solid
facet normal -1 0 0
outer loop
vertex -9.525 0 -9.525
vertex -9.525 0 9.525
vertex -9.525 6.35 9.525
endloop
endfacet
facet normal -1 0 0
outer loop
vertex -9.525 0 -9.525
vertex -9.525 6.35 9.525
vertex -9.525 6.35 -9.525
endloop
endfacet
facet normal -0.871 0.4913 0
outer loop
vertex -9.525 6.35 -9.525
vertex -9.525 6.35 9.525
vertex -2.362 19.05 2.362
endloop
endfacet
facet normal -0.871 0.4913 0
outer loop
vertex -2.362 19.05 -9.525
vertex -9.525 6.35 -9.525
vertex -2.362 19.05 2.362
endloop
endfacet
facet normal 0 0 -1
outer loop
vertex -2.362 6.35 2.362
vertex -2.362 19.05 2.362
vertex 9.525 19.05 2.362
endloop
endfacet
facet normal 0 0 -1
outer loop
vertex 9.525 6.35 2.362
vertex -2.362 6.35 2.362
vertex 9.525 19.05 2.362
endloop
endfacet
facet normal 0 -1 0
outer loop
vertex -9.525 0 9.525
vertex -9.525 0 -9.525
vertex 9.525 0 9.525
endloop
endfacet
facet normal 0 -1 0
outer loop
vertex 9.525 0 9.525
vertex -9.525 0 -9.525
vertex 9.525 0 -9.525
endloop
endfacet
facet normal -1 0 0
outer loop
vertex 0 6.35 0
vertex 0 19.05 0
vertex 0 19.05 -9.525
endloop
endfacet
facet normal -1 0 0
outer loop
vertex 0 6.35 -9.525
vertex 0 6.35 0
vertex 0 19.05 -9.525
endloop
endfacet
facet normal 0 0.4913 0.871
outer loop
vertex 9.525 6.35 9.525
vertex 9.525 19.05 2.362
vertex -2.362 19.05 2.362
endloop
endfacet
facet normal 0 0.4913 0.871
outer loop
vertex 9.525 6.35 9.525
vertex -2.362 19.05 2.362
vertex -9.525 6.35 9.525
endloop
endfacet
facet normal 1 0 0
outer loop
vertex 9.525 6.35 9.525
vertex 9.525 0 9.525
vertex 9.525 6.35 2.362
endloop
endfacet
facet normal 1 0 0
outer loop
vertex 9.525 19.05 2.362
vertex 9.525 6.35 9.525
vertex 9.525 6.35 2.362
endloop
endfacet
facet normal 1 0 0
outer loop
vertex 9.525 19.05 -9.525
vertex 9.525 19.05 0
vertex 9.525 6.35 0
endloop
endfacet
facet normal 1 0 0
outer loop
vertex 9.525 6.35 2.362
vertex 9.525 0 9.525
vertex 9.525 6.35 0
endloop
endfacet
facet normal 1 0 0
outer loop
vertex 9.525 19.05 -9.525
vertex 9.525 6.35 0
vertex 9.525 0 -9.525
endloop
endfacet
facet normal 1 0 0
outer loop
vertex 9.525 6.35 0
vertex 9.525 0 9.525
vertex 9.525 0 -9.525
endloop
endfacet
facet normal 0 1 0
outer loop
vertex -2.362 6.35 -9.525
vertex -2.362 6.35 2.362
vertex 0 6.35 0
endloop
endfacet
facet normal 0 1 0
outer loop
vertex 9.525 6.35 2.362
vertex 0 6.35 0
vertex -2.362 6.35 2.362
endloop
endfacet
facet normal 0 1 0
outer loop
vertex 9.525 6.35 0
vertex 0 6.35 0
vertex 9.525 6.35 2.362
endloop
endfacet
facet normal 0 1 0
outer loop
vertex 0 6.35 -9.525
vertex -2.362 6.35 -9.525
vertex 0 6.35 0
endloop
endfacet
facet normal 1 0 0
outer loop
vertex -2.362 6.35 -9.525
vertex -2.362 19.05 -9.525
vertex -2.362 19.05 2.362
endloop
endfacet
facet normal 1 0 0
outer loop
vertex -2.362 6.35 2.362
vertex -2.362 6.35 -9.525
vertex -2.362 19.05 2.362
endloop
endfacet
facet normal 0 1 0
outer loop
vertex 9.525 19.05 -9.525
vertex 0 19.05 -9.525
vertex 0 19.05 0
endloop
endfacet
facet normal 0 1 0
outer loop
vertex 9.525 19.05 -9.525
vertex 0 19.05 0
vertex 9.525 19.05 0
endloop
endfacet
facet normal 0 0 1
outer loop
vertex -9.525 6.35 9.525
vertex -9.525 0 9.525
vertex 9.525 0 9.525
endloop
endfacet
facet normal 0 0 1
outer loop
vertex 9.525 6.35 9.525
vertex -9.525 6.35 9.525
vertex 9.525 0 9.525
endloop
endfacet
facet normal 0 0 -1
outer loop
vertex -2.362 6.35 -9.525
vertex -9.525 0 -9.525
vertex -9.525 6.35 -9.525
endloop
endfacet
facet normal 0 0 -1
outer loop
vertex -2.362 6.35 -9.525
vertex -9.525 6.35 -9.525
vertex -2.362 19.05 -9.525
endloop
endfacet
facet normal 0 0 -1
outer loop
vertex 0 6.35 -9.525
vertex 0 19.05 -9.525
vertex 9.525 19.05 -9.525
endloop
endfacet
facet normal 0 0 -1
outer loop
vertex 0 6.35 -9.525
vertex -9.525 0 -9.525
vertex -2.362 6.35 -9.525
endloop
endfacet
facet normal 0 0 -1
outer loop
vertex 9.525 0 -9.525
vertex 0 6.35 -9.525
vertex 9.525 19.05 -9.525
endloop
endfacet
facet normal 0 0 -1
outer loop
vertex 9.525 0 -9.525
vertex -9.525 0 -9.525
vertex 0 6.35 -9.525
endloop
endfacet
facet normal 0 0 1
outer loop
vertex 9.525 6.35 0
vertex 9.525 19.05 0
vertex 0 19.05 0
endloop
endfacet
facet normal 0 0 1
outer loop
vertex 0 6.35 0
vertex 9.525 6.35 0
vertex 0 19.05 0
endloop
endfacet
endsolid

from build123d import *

# Parameters (mm, degrees)
SKETCH1_W         = 19.05
SKETCH1_H         = 19.05
BODY_DEPTH        = 19.05
SLOT_DEPTH        = 12.7
BEVEL_LEFT_DEPTH  = 19.05
BEVEL_RIGHT_DEPTH = 19.05


with BuildPart() as part:
    # Sketch1 → Body (new body)
    with BuildSketch(Plane(origin=(0, 0, 0), x_dir=(1, 0, 0), z_dir=(0, 1, 0))):
        Rectangle(SKETCH1_W, SKETCH1_H)
    extrude(amount=BODY_DEPTH)

    # Sketch2 → Slot (cut)
    with BuildSketch(Plane(origin=(0, 19.05, 0), x_dir=(1, 0, 0), z_dir=(0, 1, 0))):
        Polygon((-2.3622, 9.525), (-2.3622, -2.3622), (9.525, -2.3622), (9.525, 0), (0, 0), (0, 9.525), align=None)
    extrude(amount=-SLOT_DEPTH, mode=Mode.SUBTRACT)

    # Sketch3 → Bevel Left (cut)
    with BuildSketch(Plane.XY.offset(9.525)):
        Polygon((-2.3622, 19.05), (-9.525, 19.05), (-9.525, 6.35), align=None)
    extrude(amount=-BEVEL_LEFT_DEPTH, mode=Mode.SUBTRACT)

    # Sketch4 → Bevel Right (cut)
    with BuildSketch(Plane(origin=(9.525, 0, 0), x_dir=(0, 0, -1), z_dir=(1, 0, 0))):
        Polygon((-2.3622, 19.05), (-9.525, 6.35), (-9.525, 19.05), align=None)
    extrude(amount=-BEVEL_RIGHT_DEPTH, mode=Mode.SUBTRACT)


solid = part.part
